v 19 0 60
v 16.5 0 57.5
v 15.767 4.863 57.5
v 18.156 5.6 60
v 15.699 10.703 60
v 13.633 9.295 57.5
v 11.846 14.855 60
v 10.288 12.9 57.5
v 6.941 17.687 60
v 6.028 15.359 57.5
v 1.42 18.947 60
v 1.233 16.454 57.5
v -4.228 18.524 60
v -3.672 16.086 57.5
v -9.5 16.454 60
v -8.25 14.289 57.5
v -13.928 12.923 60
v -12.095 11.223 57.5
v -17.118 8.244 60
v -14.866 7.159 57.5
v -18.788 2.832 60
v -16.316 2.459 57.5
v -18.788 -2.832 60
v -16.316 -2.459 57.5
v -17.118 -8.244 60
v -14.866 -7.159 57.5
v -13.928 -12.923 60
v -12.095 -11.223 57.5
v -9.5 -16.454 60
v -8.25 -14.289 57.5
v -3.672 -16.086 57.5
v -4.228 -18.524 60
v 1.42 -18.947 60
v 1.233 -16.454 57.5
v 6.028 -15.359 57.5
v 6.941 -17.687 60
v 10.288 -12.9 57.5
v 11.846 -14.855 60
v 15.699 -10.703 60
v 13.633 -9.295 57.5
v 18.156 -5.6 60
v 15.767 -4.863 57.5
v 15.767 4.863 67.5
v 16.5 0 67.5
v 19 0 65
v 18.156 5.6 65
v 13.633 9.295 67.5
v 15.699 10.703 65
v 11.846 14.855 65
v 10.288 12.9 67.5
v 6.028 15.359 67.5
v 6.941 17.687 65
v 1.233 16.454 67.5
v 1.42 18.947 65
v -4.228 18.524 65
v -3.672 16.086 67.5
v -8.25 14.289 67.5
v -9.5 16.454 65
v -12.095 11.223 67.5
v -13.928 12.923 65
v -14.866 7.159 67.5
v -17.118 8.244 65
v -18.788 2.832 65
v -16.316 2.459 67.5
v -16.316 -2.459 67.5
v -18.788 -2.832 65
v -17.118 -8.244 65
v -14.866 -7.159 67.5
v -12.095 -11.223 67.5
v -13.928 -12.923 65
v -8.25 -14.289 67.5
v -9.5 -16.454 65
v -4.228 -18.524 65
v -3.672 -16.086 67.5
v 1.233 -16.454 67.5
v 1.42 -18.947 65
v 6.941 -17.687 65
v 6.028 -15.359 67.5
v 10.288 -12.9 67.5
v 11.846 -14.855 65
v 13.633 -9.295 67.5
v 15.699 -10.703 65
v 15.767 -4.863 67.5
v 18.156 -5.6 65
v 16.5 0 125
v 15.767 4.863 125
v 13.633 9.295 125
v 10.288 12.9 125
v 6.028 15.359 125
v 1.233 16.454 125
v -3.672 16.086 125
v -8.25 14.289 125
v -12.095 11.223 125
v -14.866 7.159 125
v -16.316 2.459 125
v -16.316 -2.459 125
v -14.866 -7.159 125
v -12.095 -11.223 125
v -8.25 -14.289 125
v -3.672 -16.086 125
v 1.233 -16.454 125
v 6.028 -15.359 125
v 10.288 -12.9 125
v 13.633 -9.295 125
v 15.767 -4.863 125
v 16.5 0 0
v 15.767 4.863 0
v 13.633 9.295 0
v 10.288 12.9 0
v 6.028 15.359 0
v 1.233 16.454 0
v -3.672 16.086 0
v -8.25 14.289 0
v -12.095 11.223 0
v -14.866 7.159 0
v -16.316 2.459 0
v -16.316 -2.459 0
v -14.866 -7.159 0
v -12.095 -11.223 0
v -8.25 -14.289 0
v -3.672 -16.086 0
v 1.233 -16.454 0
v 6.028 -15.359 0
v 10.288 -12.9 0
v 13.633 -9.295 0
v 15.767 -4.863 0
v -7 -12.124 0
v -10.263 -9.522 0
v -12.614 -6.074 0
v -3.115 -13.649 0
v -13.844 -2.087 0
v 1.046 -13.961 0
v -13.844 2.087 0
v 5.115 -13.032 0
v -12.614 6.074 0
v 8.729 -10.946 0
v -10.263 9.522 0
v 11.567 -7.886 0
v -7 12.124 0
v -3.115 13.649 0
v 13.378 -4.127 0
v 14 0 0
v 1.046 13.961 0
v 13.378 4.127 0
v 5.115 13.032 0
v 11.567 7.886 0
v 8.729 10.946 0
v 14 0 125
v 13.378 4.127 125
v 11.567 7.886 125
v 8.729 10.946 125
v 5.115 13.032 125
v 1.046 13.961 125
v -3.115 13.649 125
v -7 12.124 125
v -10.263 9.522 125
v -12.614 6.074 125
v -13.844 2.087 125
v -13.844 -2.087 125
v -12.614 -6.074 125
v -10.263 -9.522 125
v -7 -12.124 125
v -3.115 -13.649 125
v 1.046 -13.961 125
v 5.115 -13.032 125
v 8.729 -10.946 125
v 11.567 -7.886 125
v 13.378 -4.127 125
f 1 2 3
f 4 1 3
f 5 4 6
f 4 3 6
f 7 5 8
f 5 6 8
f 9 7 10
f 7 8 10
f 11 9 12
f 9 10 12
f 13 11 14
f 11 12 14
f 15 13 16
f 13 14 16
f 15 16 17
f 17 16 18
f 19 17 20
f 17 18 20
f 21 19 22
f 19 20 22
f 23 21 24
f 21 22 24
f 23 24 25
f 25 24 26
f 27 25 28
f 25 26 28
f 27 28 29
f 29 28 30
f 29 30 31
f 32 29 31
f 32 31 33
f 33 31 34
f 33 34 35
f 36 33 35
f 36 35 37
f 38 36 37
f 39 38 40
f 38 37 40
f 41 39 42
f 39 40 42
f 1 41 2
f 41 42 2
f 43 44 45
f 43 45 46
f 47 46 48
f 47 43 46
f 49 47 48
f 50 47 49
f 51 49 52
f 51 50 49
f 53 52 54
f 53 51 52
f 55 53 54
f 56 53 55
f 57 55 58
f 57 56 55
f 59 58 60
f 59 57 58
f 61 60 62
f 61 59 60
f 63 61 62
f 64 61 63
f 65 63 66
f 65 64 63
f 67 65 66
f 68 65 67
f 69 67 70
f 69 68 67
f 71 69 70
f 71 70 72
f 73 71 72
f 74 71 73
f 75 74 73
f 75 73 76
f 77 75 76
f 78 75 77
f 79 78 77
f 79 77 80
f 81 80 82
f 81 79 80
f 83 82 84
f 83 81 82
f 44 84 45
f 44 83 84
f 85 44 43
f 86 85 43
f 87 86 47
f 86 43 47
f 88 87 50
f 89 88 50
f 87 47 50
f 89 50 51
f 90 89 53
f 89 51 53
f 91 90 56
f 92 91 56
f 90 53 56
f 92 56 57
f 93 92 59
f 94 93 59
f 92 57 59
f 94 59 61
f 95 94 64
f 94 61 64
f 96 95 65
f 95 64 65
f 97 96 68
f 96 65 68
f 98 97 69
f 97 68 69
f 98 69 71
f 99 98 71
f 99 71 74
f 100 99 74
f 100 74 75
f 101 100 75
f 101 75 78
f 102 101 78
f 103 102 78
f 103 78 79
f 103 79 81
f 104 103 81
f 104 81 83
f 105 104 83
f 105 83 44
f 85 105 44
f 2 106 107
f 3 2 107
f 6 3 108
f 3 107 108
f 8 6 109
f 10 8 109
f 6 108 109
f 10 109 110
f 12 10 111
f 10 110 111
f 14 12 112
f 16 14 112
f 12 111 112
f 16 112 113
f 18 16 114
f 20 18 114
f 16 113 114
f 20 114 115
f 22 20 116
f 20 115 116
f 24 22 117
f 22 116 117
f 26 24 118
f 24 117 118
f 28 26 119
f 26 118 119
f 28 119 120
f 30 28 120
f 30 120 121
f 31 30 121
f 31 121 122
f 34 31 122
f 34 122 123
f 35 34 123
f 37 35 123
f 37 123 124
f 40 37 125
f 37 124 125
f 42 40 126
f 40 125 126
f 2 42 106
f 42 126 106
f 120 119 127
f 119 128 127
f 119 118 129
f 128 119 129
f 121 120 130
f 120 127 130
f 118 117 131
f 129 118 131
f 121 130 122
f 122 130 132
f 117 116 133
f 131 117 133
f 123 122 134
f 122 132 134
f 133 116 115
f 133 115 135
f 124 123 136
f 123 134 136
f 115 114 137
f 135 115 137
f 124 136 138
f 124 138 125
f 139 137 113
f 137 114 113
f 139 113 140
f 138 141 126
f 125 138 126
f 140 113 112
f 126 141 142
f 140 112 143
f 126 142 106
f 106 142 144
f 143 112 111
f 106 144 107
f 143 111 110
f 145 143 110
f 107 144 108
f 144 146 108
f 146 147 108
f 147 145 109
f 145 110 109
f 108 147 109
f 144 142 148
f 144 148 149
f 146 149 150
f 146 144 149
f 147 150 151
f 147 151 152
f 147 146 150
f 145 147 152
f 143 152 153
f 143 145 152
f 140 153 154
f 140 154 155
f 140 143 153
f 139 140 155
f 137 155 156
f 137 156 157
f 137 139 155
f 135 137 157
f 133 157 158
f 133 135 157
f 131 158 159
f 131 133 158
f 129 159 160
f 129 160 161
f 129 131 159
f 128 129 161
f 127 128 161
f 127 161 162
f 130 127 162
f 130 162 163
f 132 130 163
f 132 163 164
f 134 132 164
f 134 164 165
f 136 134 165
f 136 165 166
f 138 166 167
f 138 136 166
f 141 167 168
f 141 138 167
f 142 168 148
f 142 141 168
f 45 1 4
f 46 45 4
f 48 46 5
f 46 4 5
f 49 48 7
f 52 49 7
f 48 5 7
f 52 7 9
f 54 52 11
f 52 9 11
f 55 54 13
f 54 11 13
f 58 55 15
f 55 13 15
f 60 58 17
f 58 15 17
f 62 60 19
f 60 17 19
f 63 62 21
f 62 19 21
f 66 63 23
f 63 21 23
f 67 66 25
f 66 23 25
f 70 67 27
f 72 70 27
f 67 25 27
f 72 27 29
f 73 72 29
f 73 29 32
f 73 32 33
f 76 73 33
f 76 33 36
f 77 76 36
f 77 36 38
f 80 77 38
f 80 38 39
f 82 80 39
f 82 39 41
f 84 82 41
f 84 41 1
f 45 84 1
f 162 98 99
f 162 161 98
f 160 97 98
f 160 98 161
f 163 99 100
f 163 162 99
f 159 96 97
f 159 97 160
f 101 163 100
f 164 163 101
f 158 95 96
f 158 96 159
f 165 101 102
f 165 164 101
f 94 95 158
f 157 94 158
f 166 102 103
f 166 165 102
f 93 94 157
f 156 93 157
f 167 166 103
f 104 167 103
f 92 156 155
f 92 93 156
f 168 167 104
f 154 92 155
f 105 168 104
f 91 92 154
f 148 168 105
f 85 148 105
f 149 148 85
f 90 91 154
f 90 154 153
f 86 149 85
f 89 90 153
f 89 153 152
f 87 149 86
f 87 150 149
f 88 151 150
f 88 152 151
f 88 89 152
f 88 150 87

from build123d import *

# Parameters (mm, degrees)
F0_R     = 16.5
F0_R_2   = 14
F1_DEPTH = 125
F0_R_3   = 19
F2_DEPTH = 65
F3_DEPTH = 60
F4_SIZE  = 2.49999


# Not quite as in the source:
# - a fillet or chamfer is up to 0.001 mm smaller than in the source, because OpenCascade refuses the exact size


with BuildPart() as f1:
    # F0 (on Top) → F1 (new body)
    with BuildSketch(Plane.XY):
        Circle(F0_R)
        Circle(F0_R_2, mode=Mode.SUBTRACT)
    extrude(amount=F1_DEPTH)

    # F0 (on Top) → F2 (join)
    with BuildSketch(Plane.XY):
        Circle(F0_R_3)
        Circle(F0_R, mode=Mode.SUBTRACT)
    extrude(amount=F2_DEPTH)

    # F0 (on Top) → F3 (cut)
    with BuildSketch(Plane.XY):
        Circle(F0_R_3)
        Circle(F0_R, mode=Mode.SUBTRACT)
    extrude(amount=F3_DEPTH, mode=Mode.SUBTRACT)

    # F4 (size 2.5 in the source; OpenCascade refuses exactly that, so slightly less here)
    f4_edges = [f1.edges().sort_by_distance(p)[0] for p in [
        (-16.5, 0, 60),
        (-16.5, 0, 65),
    ]]
    chamfer(f4_edges, length=F4_SIZE)


solid = f1.part
